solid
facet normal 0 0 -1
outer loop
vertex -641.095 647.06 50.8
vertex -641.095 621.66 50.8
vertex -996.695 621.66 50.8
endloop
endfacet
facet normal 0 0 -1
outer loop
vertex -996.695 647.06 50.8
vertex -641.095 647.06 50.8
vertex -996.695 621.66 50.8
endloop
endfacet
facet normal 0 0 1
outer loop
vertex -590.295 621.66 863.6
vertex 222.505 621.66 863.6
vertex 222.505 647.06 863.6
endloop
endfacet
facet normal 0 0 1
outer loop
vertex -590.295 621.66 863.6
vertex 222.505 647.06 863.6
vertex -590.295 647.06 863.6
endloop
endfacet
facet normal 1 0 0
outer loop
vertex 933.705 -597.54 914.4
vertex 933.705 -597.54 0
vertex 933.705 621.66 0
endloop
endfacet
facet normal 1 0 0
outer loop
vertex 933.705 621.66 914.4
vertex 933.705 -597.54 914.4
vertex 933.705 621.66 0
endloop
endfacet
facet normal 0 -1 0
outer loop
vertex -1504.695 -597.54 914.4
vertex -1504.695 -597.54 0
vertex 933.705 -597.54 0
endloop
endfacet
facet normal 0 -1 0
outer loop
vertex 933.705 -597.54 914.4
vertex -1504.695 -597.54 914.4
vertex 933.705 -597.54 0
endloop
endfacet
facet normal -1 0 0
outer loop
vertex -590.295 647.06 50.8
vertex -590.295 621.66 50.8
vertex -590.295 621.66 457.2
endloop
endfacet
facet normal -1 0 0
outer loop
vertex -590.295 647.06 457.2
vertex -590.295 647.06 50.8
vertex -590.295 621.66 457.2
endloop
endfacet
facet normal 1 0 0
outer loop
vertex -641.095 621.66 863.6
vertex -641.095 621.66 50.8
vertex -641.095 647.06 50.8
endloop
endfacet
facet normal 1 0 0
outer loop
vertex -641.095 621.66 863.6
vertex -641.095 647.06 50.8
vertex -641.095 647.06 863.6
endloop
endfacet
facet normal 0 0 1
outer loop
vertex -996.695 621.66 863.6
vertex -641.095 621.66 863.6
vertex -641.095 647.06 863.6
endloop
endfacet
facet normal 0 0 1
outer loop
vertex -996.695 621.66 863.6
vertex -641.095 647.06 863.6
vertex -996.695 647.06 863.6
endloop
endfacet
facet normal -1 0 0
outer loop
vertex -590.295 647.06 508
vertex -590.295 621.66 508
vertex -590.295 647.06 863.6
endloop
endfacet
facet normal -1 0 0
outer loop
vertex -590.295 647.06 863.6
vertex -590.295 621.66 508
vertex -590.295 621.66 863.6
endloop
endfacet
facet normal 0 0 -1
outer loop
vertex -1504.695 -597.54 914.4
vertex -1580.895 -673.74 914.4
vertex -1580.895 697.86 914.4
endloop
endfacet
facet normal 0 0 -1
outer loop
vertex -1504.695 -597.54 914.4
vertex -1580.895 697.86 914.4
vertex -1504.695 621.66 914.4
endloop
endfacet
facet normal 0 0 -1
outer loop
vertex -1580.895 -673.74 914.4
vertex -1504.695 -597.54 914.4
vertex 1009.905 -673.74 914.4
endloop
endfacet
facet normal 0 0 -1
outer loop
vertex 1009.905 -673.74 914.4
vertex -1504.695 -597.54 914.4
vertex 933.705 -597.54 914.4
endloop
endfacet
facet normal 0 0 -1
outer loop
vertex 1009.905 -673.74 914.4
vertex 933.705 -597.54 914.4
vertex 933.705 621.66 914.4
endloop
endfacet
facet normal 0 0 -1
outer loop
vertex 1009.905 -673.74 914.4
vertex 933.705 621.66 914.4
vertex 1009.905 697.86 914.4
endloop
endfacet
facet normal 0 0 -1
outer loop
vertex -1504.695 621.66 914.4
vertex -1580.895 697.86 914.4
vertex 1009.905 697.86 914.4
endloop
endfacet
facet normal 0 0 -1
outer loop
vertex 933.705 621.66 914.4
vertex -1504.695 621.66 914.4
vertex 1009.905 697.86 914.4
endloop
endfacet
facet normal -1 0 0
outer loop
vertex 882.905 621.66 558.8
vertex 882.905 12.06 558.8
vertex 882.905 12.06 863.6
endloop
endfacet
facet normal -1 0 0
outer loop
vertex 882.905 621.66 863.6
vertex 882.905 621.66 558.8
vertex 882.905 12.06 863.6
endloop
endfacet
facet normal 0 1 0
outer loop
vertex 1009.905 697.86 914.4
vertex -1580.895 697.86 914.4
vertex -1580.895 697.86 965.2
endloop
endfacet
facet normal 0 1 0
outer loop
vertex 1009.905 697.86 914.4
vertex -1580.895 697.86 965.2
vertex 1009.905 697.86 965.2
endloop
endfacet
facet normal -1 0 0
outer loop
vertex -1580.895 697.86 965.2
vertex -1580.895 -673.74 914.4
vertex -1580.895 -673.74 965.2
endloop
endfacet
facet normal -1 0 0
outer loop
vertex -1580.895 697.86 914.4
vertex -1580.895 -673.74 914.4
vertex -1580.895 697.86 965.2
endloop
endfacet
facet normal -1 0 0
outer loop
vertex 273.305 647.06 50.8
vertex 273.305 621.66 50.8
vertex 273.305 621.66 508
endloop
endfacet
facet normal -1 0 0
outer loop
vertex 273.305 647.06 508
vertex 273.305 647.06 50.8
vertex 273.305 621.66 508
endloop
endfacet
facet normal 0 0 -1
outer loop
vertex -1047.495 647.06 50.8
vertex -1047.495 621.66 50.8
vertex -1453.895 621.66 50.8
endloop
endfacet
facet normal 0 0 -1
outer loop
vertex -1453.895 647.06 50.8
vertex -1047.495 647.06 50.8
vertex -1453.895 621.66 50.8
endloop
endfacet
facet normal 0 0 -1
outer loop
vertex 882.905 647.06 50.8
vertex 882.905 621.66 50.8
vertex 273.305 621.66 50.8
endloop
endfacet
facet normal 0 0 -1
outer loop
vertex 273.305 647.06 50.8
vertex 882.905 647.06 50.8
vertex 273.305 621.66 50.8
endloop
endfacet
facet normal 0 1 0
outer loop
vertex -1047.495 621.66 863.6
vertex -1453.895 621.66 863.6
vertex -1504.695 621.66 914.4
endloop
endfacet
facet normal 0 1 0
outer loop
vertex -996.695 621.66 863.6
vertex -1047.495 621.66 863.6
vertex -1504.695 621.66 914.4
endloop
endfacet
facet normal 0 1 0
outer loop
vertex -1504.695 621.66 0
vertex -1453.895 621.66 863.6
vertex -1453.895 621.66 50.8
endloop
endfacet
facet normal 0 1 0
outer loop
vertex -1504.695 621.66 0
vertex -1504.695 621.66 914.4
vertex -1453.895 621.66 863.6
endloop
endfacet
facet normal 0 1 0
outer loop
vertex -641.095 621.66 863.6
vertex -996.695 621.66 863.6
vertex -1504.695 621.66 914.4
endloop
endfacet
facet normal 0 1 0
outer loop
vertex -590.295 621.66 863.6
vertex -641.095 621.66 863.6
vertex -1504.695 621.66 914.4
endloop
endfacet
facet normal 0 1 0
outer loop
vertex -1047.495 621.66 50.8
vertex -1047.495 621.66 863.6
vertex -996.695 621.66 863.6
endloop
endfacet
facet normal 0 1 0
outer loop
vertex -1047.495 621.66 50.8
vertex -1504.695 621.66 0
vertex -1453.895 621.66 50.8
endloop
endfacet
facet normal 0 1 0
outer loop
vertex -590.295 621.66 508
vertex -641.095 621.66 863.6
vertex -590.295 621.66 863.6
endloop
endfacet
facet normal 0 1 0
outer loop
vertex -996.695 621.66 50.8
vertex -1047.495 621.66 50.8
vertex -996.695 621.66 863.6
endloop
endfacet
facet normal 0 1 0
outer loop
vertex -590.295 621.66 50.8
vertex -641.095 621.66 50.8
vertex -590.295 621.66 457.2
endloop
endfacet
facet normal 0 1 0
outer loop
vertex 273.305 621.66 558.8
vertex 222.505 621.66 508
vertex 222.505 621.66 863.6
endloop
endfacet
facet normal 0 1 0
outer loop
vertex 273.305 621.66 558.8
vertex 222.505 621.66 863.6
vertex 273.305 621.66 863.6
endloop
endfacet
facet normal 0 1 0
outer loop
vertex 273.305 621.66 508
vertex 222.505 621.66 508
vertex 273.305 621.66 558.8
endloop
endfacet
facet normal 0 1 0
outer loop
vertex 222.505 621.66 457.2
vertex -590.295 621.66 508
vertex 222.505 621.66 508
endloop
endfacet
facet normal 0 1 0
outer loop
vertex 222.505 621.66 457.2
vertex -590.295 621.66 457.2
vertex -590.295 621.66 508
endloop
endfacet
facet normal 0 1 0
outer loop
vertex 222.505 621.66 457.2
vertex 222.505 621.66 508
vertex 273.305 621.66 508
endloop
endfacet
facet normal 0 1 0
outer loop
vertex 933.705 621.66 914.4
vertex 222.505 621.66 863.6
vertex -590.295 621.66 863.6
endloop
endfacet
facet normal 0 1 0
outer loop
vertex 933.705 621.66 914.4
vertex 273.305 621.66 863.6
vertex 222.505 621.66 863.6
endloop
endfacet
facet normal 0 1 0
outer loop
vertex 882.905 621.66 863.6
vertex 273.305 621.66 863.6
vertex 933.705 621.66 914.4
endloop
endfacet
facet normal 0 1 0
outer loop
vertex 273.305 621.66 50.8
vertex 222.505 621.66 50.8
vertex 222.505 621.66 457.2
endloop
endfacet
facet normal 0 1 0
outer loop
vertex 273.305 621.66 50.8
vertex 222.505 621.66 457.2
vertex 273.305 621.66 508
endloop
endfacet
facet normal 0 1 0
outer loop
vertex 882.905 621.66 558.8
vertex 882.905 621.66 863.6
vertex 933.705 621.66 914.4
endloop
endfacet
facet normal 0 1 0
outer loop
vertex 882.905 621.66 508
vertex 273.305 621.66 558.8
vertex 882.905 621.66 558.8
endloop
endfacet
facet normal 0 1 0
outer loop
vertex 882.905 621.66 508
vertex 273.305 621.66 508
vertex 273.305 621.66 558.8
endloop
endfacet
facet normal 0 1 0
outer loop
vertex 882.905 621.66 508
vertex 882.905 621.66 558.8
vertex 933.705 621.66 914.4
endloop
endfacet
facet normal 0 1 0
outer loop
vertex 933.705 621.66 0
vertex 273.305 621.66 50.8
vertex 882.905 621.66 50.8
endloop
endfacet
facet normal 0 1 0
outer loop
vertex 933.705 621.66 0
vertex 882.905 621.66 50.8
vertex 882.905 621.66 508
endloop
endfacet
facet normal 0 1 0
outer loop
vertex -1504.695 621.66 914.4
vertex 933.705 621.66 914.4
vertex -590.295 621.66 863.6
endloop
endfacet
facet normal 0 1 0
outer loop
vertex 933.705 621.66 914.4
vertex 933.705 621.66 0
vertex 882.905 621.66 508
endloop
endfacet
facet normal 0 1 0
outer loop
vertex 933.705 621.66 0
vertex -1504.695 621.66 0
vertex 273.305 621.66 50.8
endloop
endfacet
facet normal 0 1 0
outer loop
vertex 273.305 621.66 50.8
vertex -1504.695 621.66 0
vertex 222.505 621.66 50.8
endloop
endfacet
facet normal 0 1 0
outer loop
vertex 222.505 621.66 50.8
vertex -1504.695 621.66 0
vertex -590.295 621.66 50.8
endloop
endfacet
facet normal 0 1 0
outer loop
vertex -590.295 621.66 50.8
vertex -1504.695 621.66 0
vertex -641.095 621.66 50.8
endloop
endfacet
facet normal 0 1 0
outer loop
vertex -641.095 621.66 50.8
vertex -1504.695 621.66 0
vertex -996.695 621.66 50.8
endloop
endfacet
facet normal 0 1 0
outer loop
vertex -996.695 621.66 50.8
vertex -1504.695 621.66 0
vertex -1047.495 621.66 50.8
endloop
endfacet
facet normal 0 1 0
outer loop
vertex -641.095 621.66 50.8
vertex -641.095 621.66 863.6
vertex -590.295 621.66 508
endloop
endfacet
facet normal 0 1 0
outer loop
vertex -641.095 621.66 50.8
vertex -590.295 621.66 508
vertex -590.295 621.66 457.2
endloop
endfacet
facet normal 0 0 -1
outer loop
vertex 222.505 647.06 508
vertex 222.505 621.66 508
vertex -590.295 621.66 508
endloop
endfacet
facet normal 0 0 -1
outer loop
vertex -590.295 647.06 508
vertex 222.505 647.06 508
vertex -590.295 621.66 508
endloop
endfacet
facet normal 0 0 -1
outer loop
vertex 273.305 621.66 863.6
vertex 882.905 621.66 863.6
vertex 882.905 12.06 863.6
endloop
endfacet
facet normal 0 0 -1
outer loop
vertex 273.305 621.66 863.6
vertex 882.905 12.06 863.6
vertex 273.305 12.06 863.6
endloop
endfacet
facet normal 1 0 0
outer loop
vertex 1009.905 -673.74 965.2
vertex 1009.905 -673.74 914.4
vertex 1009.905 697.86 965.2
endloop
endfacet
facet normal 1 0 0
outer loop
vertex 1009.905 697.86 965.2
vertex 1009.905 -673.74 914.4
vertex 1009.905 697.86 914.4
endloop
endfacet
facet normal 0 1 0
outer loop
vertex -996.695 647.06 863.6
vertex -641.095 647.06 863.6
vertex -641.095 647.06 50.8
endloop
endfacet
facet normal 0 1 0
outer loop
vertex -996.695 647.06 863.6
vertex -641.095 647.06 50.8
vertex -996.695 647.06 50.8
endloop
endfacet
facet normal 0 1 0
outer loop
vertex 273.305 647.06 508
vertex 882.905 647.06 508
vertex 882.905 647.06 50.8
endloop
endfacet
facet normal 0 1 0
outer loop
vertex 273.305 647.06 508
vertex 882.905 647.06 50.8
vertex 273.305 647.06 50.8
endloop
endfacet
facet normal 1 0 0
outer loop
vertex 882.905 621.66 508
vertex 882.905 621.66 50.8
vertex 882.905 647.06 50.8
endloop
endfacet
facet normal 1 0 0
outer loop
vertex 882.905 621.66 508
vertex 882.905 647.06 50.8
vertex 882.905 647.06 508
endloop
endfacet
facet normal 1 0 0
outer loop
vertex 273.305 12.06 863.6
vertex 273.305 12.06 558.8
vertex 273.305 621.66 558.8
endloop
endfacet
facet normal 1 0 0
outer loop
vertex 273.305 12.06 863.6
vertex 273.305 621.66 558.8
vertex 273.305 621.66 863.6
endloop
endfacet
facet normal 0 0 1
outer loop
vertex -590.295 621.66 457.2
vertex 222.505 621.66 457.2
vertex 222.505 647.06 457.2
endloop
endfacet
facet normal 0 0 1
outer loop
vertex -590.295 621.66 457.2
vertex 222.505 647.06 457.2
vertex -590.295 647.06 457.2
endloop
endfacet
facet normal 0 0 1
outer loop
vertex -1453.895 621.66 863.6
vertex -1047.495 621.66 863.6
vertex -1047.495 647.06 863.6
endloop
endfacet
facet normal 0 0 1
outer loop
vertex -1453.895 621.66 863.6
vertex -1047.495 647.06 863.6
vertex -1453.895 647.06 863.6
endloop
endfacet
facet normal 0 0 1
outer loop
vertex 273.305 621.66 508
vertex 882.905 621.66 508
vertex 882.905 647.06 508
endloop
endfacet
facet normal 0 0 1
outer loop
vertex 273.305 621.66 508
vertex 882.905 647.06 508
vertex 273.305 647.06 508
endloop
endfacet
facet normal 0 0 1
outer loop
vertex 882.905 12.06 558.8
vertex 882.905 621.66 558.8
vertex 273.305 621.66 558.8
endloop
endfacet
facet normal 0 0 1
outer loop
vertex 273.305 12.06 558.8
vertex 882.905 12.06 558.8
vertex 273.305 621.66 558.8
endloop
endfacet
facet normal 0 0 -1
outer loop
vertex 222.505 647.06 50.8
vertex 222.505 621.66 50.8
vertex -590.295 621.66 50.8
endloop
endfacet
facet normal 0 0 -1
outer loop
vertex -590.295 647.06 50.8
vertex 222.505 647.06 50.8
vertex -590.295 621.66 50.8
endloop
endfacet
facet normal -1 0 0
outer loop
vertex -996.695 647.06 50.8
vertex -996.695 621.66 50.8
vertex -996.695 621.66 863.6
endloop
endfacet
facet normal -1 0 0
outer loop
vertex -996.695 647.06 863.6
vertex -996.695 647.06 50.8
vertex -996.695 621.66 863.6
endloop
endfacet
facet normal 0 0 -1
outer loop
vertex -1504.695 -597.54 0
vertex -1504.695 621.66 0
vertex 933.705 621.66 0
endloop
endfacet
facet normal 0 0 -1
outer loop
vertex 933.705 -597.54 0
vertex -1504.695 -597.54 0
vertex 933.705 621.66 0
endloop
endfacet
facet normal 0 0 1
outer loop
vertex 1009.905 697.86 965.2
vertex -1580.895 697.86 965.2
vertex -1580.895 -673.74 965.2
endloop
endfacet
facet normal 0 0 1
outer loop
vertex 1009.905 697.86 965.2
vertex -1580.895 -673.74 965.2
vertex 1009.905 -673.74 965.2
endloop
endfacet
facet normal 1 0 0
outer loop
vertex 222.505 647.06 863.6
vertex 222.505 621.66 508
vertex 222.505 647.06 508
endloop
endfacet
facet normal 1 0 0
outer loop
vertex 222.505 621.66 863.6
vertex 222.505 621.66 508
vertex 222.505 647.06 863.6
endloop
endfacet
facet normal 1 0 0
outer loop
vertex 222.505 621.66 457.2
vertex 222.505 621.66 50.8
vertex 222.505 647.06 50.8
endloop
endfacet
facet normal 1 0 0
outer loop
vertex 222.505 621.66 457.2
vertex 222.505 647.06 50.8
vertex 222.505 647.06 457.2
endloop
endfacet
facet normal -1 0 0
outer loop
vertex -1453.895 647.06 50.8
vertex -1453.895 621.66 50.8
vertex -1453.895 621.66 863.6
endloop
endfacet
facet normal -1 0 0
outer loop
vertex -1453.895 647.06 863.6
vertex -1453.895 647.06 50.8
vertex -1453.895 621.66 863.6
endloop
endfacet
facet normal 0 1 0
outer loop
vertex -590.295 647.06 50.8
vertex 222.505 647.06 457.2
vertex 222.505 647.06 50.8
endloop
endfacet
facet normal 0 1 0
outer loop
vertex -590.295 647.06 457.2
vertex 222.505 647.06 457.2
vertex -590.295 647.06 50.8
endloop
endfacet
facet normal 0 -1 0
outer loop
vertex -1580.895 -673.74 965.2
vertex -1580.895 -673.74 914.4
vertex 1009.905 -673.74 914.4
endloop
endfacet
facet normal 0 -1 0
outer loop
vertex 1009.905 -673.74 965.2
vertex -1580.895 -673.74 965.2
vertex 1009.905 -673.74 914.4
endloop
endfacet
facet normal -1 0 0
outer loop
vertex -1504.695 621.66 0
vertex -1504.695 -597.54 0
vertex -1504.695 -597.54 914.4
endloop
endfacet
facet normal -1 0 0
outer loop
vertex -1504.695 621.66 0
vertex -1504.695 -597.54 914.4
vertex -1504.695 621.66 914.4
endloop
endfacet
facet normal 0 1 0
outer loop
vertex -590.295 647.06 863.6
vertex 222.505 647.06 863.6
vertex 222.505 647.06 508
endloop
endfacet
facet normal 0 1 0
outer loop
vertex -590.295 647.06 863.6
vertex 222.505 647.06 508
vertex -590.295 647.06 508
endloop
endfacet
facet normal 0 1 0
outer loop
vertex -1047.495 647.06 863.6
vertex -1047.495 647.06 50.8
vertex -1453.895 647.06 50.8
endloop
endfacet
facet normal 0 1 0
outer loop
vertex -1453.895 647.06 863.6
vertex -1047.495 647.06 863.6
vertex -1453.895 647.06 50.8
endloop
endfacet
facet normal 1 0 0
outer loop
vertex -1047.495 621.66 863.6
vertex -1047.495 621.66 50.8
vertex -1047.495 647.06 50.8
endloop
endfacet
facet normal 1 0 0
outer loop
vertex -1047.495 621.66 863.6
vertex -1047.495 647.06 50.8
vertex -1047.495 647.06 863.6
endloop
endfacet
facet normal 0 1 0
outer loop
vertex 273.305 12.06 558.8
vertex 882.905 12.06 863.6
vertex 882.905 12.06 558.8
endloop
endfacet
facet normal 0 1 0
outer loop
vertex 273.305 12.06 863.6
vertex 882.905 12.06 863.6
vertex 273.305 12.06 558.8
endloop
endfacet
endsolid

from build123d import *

# Parameters (mm, degrees)
F0_W     = 2438.4
F0_H     = 1219.2
F1_DEPTH = 914.4
F2_W     = 2590.8
F2_H     = 1371.6
F3_DEPTH = 50.8
F4_W     = 609.6
F4_H     = 304.8
F5_DEPTH = 609.6
F6_W     = 609.6
F6_H     = 457.2
F6_W_2   = 812.8
F6_H_2   = 355.6
F6_H_3   = 406.4
F6_W_3   = 355.6
F6_H_4   = 812.8
F6_W_4   = 406.4
F7_DEPTH = 25.4


with BuildPart() as f1:
    # F0 (on Top) → F1 (new body)
    with BuildSketch(Plane.XY):
        with Locations((-285.494889, 12.059888)):
            Rectangle(F0_W, F0_H)
    extrude(amount=F1_DEPTH)

    # F2 (on face) → F3 (join)
    with BuildSketch(Plane.XY.offset(914.4)):
        with Locations((-285.494889, 12.059888)):
            Rectangle(F2_W, F2_H)
    extrude(amount=F3_DEPTH)

    # F4 (on face) → F5 (cut)
    with BuildSketch(Plane(origin=(0, 621.659888, 0), x_dir=(-1, 0, 0), z_dir=(0, 1, 0))):
        with Locations((-578.105111, 711.2)):
            Rectangle(F4_W, F4_H)
    extrude(amount=-F5_DEPTH, mode=Mode.SUBTRACT)

    # F6 (on face) → F7 (join)
    with BuildSketch(Plane(origin=(0, 621.659888, 0), x_dir=(-1, 0, 0), z_dir=(0, 1, 0))):
        with Locations((-578.105111, 279.4)):
            Rectangle(F6_W, F6_H)
        with Locations((183.894889, 685.8)):
            Rectangle(F6_W_2, F6_H_2)
        with Locations((183.894889, 254)):
            Rectangle(F6_W_2, F6_H_3)
        with Locations((818.894889, 457.2)):
            Rectangle(F6_W_3, F6_H_4)
        with Locations((1250.694889, 457.2)):
            Rectangle(F6_W_4, F6_H_4)
    extrude(amount=F7_DEPTH)


solid = f1.part
